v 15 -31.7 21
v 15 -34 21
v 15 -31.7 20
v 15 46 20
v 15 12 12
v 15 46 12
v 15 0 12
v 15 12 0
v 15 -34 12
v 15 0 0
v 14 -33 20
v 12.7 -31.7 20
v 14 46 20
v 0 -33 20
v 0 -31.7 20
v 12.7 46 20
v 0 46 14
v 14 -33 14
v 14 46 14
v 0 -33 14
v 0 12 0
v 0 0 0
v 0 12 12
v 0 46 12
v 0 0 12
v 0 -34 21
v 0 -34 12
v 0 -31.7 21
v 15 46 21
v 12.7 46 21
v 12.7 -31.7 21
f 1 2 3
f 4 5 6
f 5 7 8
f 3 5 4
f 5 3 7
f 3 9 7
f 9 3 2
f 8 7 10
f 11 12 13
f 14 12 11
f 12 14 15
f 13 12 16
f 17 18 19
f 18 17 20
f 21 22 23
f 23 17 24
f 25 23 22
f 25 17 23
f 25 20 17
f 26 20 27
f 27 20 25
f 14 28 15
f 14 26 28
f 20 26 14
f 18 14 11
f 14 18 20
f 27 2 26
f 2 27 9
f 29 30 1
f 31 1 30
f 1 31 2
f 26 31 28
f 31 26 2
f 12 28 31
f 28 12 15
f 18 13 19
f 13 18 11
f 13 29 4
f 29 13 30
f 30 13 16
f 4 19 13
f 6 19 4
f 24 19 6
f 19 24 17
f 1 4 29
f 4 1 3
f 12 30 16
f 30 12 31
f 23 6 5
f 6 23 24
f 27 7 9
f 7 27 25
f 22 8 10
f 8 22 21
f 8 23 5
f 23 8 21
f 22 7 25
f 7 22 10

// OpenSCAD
module clip() {
  nutX = 15;
  nutY = 12;
  nutZ = 12;
  cube([nutX, nutY, nutZ]);

  module corner(xyz) { 
    lip = 1.3;
    height = 6;
    x1 = xyz[0];
    y1 = 1;

    translate([0,0,xyz[2]]) {
      cube([x1, y1, height]); 
      translate([0, 0, height]) {
        cube([x1, y1+lip, 1]);
      }
    }

    x2 = 1;
    y2 = xyz[1];

    translate([xyz[0]-x2, 0, xyz[2]]) {
      cube([x2, y2, height]);
      translate([-lip,0,height]) {
        cube([x2+lip, y2, 1]);
      }
    }
  };

  module cubeWithCorner(xyz) {
    cube(xyz);
    corner(xyz);
  }

  ySup = 80;
  translate([0, -ySup/2 + nutY/2, nutZ]){
    cubeWithCorner([15, ySup, 2]);
  }
}

clip();
